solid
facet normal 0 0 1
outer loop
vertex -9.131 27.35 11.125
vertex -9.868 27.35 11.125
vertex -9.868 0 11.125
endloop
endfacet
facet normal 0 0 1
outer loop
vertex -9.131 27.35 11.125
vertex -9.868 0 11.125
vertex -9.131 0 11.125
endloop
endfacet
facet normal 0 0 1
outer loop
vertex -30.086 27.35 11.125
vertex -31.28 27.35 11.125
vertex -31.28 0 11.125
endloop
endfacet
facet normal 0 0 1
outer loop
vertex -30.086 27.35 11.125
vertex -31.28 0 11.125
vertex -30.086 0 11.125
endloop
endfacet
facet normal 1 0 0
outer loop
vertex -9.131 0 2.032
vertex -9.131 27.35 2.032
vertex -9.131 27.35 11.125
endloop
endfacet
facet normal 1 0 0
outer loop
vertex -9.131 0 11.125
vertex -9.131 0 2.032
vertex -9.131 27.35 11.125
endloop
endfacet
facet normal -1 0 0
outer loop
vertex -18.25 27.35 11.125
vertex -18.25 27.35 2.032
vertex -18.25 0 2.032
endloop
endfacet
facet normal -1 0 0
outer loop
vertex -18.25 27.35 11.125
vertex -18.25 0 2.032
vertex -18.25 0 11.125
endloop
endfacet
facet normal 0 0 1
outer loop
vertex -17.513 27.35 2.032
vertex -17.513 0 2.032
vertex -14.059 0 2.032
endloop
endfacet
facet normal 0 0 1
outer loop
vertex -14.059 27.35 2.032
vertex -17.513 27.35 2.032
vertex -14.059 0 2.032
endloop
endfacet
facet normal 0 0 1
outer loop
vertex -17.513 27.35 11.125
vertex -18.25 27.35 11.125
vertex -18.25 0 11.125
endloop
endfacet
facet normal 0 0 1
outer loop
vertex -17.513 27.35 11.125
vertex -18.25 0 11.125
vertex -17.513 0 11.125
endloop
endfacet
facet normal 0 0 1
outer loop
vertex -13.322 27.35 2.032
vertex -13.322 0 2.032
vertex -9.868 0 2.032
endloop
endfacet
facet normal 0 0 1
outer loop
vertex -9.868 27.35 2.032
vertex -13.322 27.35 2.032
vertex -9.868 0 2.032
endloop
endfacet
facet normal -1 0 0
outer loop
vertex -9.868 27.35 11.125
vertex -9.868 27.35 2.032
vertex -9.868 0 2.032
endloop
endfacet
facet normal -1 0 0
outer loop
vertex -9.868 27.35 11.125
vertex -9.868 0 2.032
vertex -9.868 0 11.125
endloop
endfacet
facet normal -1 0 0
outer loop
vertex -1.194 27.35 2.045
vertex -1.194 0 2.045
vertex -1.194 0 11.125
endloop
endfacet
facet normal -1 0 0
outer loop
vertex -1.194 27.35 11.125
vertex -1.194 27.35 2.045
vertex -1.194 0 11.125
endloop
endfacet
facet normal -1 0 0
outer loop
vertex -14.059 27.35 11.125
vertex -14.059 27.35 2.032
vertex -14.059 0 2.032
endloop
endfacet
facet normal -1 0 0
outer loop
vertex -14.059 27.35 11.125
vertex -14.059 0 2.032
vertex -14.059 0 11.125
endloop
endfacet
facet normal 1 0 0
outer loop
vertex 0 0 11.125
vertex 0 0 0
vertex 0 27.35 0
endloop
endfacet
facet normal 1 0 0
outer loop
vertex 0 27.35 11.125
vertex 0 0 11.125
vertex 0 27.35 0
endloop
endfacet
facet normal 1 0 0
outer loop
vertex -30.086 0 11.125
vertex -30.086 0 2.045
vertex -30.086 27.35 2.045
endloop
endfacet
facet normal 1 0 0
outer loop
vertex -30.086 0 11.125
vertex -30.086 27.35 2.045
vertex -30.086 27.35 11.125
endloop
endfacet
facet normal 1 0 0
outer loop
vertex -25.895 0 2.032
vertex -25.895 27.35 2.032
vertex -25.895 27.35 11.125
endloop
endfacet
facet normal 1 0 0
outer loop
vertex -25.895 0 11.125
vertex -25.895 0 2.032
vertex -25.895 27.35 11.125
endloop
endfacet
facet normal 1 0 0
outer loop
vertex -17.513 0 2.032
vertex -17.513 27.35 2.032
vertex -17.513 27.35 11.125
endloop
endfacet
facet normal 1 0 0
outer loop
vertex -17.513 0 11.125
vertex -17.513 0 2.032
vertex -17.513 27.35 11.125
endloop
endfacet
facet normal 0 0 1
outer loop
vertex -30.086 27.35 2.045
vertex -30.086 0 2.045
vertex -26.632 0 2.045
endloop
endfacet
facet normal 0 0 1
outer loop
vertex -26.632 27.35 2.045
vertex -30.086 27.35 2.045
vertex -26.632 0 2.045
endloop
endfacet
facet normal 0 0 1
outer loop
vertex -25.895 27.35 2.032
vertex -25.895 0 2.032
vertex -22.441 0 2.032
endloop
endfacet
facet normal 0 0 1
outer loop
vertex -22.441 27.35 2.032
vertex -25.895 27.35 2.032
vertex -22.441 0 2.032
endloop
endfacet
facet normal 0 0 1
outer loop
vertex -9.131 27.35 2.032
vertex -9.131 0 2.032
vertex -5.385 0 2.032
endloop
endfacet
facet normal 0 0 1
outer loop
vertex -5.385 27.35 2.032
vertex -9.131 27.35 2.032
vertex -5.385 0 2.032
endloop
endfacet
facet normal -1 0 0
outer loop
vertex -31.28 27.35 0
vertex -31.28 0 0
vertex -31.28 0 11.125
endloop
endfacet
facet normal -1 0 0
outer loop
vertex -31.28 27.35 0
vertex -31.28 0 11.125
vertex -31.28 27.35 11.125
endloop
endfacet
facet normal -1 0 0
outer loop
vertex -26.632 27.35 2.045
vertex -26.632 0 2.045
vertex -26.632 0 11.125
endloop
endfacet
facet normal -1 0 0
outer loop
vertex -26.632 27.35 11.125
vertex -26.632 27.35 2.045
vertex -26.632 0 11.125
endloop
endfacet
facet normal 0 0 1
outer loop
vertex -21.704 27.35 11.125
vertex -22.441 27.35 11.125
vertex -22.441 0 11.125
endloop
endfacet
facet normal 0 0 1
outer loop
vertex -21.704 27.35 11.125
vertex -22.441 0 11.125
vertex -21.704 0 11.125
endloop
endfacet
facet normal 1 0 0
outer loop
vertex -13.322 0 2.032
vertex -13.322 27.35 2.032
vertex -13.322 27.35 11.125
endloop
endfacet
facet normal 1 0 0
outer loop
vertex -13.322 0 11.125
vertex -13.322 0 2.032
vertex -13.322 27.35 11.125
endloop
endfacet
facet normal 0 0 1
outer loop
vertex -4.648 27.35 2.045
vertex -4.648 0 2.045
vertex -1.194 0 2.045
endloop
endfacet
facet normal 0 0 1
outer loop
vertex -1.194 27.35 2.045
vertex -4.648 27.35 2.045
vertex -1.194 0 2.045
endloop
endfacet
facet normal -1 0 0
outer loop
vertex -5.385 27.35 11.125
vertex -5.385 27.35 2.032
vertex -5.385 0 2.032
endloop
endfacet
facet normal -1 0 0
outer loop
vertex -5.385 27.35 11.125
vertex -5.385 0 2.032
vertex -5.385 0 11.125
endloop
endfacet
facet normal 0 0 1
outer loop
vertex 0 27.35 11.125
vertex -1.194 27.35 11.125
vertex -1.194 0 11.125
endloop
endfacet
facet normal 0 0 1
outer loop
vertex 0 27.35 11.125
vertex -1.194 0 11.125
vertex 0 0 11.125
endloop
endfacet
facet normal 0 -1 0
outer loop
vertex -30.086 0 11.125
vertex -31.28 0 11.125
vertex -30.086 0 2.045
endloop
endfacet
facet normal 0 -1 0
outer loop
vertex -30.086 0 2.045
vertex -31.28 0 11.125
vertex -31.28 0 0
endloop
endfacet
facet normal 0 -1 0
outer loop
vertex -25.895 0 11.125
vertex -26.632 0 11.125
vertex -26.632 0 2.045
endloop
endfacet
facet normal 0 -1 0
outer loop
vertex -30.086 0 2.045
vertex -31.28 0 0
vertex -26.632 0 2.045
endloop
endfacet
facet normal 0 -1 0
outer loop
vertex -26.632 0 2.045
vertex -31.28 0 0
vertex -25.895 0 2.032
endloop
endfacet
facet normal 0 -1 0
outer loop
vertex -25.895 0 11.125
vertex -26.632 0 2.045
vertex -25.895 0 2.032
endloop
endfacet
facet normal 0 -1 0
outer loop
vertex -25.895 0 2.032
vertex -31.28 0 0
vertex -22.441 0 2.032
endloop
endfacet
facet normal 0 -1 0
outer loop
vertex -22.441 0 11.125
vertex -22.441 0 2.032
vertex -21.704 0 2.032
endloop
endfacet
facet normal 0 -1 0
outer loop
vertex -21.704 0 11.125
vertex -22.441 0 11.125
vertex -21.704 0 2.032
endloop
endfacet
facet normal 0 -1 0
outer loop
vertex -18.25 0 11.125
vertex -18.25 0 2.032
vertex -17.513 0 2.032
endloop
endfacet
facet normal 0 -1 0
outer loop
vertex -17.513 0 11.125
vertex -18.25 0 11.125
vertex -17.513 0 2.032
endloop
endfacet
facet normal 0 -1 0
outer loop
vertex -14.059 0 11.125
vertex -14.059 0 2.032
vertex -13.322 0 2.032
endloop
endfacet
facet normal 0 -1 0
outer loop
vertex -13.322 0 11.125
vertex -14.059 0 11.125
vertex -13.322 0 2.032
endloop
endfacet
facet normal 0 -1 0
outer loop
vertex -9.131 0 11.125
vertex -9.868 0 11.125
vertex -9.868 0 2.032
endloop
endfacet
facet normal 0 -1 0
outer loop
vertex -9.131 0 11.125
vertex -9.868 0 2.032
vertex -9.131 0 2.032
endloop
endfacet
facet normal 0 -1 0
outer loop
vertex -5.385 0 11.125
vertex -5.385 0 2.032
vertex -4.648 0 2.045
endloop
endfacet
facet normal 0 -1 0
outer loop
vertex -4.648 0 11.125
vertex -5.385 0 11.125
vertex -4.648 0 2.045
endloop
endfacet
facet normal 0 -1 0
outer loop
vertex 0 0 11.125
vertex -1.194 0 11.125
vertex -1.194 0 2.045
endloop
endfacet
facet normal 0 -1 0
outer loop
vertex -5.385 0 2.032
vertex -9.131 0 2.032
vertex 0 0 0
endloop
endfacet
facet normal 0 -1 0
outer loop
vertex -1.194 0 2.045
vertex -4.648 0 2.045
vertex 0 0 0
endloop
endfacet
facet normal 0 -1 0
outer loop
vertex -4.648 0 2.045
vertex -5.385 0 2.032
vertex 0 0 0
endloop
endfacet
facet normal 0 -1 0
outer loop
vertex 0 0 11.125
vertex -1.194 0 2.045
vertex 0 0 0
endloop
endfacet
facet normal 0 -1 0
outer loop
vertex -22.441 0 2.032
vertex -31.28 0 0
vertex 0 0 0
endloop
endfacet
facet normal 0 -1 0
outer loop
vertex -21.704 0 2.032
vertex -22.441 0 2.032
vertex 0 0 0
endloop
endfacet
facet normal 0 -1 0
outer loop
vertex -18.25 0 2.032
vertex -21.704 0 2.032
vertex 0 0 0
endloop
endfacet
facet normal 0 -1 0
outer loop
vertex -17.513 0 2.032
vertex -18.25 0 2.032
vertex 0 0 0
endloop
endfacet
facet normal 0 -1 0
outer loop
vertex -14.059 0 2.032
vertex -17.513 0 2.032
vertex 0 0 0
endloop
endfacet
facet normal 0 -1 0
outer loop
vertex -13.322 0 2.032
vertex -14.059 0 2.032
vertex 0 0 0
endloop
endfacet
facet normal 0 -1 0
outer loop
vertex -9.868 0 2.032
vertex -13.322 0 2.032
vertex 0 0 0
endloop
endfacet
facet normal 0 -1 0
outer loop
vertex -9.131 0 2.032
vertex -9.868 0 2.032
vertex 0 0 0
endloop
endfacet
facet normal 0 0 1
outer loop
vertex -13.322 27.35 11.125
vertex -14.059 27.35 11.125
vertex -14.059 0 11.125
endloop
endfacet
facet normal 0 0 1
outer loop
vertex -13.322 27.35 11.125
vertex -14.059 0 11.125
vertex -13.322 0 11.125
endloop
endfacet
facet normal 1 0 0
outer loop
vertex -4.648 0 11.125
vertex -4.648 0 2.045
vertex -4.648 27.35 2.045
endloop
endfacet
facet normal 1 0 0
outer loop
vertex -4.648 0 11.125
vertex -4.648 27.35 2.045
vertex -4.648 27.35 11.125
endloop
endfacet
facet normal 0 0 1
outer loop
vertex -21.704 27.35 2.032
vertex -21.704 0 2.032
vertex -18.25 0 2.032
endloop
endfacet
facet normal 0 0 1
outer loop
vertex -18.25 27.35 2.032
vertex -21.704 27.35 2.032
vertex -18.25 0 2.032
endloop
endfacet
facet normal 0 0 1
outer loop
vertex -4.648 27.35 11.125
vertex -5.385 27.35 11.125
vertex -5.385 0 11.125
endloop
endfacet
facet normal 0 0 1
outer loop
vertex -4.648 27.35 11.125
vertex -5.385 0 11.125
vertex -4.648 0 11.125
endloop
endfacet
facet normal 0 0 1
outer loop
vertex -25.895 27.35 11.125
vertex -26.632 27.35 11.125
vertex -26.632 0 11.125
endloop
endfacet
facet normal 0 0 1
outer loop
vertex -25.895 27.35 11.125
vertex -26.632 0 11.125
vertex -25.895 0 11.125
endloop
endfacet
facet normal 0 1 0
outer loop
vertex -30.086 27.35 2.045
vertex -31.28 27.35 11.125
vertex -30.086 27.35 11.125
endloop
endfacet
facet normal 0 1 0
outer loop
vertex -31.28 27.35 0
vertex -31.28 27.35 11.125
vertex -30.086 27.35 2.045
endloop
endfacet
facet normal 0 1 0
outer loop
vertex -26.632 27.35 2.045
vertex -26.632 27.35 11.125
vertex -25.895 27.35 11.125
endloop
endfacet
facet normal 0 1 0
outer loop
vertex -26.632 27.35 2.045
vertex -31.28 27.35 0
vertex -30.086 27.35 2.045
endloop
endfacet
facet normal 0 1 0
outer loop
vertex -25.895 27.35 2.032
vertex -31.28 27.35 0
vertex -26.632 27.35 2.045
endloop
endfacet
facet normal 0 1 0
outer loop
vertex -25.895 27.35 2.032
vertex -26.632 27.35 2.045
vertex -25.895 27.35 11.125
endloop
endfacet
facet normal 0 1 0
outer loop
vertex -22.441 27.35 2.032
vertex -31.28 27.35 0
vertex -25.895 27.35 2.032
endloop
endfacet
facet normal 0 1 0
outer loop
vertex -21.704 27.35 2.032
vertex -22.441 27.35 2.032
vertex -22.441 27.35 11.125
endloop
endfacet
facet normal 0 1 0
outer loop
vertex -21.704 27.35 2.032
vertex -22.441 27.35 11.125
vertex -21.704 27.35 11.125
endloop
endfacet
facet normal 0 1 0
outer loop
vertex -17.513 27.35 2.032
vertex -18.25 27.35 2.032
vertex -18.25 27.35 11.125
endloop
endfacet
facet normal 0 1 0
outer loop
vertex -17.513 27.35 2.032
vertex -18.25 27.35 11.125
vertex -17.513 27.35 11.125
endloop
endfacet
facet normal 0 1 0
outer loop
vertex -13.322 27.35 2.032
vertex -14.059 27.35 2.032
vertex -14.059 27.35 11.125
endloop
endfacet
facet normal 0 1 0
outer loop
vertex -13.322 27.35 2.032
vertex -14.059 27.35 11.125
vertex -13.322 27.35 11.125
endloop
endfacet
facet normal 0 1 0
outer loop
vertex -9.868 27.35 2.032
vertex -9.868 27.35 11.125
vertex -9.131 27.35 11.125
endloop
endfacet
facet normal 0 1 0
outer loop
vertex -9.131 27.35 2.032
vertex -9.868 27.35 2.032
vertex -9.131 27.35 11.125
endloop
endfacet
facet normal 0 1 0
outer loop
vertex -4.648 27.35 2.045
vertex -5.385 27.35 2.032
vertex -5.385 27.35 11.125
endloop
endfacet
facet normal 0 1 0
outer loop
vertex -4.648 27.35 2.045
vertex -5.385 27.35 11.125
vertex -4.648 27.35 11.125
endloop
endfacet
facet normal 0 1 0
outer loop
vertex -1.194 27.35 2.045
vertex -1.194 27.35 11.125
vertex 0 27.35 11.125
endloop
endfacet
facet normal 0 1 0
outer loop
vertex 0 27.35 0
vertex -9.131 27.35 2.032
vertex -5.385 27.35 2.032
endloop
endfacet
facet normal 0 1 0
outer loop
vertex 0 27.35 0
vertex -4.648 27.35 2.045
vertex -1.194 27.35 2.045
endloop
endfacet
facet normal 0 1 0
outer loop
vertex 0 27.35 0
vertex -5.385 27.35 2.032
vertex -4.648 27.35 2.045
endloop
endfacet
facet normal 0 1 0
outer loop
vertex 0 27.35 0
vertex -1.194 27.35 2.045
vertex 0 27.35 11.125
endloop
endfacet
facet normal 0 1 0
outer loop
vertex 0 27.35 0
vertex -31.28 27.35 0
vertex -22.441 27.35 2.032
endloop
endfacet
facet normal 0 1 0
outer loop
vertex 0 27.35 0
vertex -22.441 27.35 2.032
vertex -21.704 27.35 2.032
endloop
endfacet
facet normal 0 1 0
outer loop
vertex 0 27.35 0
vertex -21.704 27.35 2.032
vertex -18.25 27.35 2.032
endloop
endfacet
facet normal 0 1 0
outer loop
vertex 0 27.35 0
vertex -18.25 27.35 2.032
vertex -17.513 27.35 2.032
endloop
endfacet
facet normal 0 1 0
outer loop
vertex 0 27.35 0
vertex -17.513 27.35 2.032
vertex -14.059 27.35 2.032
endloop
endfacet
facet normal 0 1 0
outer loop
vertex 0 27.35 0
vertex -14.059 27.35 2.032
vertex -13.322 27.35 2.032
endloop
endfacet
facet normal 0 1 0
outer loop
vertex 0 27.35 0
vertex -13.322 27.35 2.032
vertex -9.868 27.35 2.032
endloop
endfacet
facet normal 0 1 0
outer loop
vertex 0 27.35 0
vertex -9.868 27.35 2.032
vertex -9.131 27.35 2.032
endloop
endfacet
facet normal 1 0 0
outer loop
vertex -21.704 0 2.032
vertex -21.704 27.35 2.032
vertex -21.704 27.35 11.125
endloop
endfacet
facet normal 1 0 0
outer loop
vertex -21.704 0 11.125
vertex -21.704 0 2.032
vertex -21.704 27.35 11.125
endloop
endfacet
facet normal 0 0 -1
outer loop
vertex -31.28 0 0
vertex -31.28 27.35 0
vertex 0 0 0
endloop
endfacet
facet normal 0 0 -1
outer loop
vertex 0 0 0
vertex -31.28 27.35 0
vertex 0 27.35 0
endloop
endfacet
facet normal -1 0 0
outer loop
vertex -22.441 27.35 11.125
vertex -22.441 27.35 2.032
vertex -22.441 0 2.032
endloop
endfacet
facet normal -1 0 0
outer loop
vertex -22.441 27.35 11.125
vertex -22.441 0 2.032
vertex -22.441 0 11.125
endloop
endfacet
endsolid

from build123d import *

# Parameters (mm, degrees)
F0_W     = 31.28
F0_H     = 27.35
F1_DEPTH = 11.1252
F2_W     = 3.4544
F2_H     = 9.0932
F2_W_2   = 3.7464
F2_H_2   = 9.0805
F3_DEPTH = 27.351


with BuildPart() as f1:
    # F0 (on Top) → F1 (new body)
    with BuildSketch(Plane.XY):
        with Locations((-15.64, 13.675)):
            Rectangle(F0_W, F0_H)
    extrude(amount=F1_DEPTH)

    # F2 (on face) → F3 (cut, through all)
    with BuildSketch(Plane.XZ):
        with Locations((-24.168, 6.5786)):
            Rectangle(F2_W, F2_H)
        with Locations((-19.977, 6.5786)):
            Rectangle(F2_W, F2_H)
        with Locations((-15.786, 6.5786)):
            Rectangle(F2_W, F2_H)
        with Locations((-11.595, 6.5786)):
            Rectangle(F2_W, F2_H)
        with Locations((-7.258, 6.5786)):
            Rectangle(F2_W_2, F2_H)
        with Locations((-2.921, 6.58495)):
            Rectangle(F2_W, F2_H_2)
        with Locations((-28.359, 6.58495)):
            Rectangle(F2_W, F2_H_2)
    extrude(amount=-F3_DEPTH, mode=Mode.SUBTRACT)


solid = f1.part
